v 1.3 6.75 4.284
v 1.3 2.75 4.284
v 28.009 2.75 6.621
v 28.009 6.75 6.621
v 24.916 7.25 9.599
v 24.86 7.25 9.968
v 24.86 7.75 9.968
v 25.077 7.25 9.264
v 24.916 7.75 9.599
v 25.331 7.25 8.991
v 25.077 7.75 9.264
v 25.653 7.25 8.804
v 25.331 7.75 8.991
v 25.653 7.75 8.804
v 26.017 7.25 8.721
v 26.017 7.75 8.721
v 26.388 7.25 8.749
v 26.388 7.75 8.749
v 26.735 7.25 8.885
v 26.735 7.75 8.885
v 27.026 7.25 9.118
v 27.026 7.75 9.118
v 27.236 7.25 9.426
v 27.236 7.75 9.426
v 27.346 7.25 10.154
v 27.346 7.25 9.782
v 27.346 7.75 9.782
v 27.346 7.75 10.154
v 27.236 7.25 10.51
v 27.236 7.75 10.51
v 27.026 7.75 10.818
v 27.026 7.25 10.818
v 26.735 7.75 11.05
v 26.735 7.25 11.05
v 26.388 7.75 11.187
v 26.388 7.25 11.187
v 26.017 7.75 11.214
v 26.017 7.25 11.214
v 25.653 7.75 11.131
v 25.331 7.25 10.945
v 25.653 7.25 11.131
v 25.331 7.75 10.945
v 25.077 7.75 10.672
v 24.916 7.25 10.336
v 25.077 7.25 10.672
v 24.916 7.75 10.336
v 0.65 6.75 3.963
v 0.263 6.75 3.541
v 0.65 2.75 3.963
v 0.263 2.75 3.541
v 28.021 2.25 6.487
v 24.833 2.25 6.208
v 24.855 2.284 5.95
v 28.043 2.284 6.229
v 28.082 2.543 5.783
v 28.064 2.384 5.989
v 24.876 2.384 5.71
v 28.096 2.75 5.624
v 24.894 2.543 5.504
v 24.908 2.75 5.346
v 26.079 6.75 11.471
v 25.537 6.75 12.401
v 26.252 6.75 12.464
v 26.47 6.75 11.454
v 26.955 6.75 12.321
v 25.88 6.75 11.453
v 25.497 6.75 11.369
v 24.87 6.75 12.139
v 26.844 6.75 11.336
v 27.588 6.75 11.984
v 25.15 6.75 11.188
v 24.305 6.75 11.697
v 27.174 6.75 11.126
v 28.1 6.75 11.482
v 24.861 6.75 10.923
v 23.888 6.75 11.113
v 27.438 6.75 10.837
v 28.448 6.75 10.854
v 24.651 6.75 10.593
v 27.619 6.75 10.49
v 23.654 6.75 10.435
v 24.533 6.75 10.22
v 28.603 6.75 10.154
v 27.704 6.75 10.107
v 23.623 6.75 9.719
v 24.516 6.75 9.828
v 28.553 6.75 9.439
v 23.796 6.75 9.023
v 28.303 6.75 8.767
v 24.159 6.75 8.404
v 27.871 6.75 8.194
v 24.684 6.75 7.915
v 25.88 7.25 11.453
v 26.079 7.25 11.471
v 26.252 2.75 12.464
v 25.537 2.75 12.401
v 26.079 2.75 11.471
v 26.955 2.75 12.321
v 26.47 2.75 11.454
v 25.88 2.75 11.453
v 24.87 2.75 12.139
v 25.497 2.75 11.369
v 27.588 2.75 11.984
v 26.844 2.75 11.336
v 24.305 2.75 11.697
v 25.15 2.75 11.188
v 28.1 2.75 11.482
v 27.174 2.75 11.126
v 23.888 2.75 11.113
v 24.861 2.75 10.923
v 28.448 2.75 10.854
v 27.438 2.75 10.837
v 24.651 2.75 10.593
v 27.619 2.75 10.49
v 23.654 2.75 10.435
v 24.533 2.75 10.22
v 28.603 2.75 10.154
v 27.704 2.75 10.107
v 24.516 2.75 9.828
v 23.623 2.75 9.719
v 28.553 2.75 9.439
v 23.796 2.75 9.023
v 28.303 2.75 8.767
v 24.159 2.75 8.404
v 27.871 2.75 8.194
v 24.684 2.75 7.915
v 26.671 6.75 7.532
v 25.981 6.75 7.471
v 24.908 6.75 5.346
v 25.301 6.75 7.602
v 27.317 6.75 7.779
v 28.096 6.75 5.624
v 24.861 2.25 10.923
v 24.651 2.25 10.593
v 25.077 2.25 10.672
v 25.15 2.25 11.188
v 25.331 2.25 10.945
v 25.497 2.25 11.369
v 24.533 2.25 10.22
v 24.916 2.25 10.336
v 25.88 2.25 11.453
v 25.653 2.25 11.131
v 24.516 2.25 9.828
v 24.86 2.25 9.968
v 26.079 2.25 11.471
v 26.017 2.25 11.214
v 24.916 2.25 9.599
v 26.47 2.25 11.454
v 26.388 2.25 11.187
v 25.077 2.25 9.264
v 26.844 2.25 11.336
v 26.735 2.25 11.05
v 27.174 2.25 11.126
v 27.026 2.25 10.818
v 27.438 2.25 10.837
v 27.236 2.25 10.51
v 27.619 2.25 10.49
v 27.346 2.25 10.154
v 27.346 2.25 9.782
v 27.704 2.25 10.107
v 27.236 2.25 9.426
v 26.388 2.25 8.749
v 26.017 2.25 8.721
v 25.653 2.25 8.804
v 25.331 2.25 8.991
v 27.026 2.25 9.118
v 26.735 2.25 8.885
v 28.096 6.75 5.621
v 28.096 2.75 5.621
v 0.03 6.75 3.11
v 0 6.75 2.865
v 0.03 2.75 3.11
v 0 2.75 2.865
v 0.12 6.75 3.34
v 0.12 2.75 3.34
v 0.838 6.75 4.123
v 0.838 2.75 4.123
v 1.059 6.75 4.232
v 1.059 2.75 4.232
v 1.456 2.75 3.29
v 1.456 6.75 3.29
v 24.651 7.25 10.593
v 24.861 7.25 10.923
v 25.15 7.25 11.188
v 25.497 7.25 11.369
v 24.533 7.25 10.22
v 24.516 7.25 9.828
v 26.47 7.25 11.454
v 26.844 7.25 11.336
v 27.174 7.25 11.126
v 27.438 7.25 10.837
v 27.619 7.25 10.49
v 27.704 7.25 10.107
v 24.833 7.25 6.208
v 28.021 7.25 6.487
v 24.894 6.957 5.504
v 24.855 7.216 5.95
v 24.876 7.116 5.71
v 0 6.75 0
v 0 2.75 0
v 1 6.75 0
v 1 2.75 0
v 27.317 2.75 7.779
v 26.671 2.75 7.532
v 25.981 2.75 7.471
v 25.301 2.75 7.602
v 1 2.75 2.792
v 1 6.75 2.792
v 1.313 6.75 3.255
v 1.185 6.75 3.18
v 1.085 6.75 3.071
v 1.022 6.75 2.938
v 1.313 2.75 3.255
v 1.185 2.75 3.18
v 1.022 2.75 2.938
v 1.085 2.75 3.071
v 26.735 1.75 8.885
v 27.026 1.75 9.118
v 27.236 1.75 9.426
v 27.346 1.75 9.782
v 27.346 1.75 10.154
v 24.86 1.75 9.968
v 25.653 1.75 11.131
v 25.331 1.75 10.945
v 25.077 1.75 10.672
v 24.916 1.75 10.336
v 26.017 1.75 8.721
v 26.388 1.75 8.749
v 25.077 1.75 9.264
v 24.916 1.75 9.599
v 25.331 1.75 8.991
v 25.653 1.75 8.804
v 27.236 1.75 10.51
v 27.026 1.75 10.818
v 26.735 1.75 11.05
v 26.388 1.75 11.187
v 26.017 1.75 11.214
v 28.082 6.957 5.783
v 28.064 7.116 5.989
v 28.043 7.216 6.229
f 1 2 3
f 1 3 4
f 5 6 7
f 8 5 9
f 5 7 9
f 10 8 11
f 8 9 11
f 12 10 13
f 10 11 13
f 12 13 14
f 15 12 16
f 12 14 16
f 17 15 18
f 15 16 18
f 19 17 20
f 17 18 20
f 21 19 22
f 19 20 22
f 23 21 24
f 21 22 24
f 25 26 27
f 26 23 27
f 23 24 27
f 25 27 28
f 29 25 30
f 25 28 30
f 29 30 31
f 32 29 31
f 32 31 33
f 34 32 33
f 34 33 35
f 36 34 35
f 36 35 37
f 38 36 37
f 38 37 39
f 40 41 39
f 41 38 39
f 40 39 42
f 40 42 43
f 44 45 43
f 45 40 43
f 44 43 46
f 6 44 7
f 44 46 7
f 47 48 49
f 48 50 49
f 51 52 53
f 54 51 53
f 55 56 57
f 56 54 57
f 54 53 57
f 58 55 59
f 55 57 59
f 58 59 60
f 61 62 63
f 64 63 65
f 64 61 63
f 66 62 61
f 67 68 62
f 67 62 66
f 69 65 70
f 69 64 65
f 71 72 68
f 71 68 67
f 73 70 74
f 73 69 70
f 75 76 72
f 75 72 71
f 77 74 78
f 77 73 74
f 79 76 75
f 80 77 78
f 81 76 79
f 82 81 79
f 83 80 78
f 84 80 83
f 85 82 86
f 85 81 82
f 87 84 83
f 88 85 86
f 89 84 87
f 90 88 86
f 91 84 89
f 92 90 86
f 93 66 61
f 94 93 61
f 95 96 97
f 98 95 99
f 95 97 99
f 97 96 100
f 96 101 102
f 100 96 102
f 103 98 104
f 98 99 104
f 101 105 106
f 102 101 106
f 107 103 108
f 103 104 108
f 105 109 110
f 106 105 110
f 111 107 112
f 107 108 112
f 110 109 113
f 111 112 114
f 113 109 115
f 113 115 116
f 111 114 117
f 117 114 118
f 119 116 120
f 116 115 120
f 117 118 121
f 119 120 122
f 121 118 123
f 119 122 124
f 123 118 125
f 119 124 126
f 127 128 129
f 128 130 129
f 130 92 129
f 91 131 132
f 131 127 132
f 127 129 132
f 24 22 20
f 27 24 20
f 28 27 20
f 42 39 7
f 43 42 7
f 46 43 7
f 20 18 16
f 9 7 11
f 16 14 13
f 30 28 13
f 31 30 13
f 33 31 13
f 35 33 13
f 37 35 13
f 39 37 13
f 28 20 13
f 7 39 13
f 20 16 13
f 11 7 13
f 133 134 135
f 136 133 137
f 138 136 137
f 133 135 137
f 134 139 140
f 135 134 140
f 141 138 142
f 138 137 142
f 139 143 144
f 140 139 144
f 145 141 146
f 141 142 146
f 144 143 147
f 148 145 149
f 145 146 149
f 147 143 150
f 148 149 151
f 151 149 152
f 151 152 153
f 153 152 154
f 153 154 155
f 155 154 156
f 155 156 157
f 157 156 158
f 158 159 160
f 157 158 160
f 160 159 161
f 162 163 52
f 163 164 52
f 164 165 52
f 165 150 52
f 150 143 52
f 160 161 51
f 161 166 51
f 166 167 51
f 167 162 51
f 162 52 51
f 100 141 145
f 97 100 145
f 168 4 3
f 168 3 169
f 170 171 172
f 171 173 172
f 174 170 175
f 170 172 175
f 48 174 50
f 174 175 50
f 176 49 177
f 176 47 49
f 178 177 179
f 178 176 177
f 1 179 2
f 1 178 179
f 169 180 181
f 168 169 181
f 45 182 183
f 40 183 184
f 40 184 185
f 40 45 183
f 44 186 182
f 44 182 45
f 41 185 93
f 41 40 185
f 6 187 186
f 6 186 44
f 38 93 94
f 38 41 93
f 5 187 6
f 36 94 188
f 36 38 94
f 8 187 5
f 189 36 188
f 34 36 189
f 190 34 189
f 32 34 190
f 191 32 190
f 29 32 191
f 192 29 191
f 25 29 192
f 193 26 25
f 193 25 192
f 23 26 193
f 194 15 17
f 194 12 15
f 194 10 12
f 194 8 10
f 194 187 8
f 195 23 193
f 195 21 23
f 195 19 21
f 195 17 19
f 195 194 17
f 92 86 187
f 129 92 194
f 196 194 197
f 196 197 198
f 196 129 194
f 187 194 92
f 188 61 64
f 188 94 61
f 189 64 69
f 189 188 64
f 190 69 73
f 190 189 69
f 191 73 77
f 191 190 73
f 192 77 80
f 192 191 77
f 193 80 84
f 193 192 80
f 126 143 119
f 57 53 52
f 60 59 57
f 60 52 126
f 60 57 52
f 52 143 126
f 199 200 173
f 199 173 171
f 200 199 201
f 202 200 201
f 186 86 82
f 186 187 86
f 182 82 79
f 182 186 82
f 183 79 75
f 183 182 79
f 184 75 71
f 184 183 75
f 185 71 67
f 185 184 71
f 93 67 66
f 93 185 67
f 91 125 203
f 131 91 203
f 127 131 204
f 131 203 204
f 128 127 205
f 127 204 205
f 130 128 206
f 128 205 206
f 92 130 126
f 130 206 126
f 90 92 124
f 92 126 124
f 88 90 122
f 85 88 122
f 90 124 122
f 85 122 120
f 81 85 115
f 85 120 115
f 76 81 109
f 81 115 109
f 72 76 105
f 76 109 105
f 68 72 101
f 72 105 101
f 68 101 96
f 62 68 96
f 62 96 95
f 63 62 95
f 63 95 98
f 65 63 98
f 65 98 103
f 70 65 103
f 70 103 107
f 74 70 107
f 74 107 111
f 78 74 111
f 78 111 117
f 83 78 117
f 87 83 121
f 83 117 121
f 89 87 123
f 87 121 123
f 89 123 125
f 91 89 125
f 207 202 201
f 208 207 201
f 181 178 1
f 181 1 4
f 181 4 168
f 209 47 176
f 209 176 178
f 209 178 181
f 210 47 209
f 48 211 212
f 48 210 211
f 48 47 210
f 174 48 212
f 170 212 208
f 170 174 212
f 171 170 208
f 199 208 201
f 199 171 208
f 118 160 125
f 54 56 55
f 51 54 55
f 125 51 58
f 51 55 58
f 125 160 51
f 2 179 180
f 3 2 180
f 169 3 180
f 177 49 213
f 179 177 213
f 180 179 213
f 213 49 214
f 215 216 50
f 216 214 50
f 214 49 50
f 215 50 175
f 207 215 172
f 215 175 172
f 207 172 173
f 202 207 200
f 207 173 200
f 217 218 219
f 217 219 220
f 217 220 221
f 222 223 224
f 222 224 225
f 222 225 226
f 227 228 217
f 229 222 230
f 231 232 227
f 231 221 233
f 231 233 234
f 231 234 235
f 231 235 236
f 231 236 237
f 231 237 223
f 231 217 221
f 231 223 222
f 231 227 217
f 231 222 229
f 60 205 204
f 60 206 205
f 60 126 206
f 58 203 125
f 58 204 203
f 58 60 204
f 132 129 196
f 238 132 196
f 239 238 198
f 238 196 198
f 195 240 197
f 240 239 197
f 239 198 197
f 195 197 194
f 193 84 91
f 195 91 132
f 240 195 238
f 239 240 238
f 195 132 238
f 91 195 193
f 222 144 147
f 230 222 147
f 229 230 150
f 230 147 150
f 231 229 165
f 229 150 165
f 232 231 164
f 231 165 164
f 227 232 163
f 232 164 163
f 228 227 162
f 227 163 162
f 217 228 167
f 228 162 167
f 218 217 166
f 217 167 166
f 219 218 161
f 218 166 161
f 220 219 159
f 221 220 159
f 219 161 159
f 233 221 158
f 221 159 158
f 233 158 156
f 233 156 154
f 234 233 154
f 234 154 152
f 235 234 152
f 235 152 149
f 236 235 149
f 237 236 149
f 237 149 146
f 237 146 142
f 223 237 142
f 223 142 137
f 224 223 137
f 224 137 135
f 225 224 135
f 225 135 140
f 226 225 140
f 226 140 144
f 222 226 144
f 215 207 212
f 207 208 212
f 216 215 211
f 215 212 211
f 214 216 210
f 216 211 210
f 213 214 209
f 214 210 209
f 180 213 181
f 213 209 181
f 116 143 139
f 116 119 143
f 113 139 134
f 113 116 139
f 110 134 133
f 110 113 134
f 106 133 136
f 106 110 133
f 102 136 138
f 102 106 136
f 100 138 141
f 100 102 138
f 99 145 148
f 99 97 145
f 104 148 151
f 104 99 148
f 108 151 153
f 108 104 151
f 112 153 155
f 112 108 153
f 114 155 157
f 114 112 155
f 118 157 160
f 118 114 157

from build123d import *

# Parameters (mm, degrees)
SKETCH1_W                  = 1
SKETCH1_H                  = 4
BOSS_EXTRUDE1_DEPTH        = 4.25
CHAMFER1_SIZE              = 1
CHAMFER1_SIZE2             = 0.087488664
SKETCH2_W                  = 1.003819838
SKETCH2_H                  = 4
BOSS_EXTRUDE2_DEPTH        = 27.2
CHAMFER2_START             = -4
CHAMFER2_OUTLINE_W         = 4
CHAMFER2_OUTLINE_H         = 7
CHAMFER2_DEPTH             = 1.801741323
FILLET2_R                  = 0.5
FILLET3_R                  = 1
BOSS_EXTRUDE3_DEPTH        = 5
BOSS_EXTRUDE3_DEPTH_BACK   = 1
SKETCH3_W                  = 3.2
SKETCH3_H                  = 0.5
BOSS_EXTRUDE3_2_DEPTH      = 5
BOSS_EXTRUDE3_2_DEPTH_BACK = 1
FILLET5_R                  = 1
FILLET6_R                  = 1
FILLET9_R                  = 1.5
FILLET10_R                 = 1.5
BOSS_EXTRUDE4_DEPTH        = 0.5
BOSS_EXTRUDE4_DEPTH_BACK   = 5.5
SKETCH5_R                  = 1.25
SKETCH6_R                  = 2.5
BOSS_EXTRUDE5_DEPTH        = 4


with BuildPart() as part:
    # Sketch1 → Boss-Extrude1 (new body)
    with BuildSketch(Plane.XY):
        with Locations((0.5, 4.75)):
            Rectangle(SKETCH1_W, SKETCH1_H)
    extrude(amount=BOSS_EXTRUDE1_DEPTH)

    # Chamfer1
    chamfer1_edges = [part.edges().sort_by_distance(p)[0] for p in [
        (1, 4.75, 4.25),
    ]]
    chamfer1_side = [part.faces().sort_by_distance(p)[0] for p in [
        (1, 4.75, 2.125),
    ]]
    chamfer(chamfer1_edges, length=CHAMFER1_SIZE, length2=CHAMFER1_SIZE2, reference=chamfer1_side[0])

    # Sketch2 → Boss-Extrude2 (add)
    with BuildSketch(Plane(origin=(1.274582165, 0, 0.11151149), x_dir=(0.08715574274765592, 0, -0.9961946980917458), z_dir=(0.9961946980917459, 0, 0.08715574274765593))):
        with Locations((-3.652386945, 4.75)):
            Rectangle(SKETCH2_W, SKETCH2_H)
    extrude(amount=BOSS_EXTRUDE2_DEPTH)

    # Chamfer2: read off the stored shape, not the designer's step
    # Chamfer2 outline → Chamfer2 (cut)
    with BuildSketch(Plane(origin=(0, 0, 0), x_dir=(0.6755902076156571, 0, 0.737277336810127), z_dir=(0.737277336810127, 0, -0.675590207615657)).offset(CHAMFER2_START)):
        with Locations((3, -4.5)):
            Rectangle(CHAMFER2_OUTLINE_W, CHAMFER2_OUTLINE_H)
    extrude(amount=CHAMFER2_DEPTH, mode=Mode.SUBTRACT)

    # Fillet2
    fillet2_edges = [part.edges().sort_by_distance(p)[0] for p in [
        (1, 4.75, 3.25),
    ]]
    fillet(fillet2_edges, radius=FILLET2_R)

    # Fillet3
    fillet3_edges = [part.edges().sort_by_distance(p)[0] for p in [
        (0, 4.75, 3.253834428),
        (0.912844258, 4.75, 4.250029127),
    ]]
    fillet(fillet3_edges, radius=FILLET3_R)


with BuildPart() as body_2:
    # Sketch3 → Boss-Extrude3 (new, two sides: drawn at the far end of the back side and taken through both)
    with BuildSketch(Plane(origin=(-0.362070829, 0, 4.13848851), x_dir=(0.9961946980917458, 0, 0.08715574274765595), z_dir=(-0.08715574274765596, 0, 0.9961946980917459)).offset(-BOSS_EXTRUDE3_DEPTH_BACK)):
        with Locations((26.879450862, 7)):
            Rectangle(SKETCH3_W, SKETCH3_H)
    extrude(amount=BOSS_EXTRUDE3_DEPTH + BOSS_EXTRUDE3_DEPTH_BACK)

    # Fillet5
    # the kernel refuses this fillet: 1 mm, written as the material it takes off along each edge
    with BuildSketch(Plane(origin=(22.751515044, 7.25, 5.15684541), x_dir=(-0.08715574274765596, 0, 0.9961946980917458), z_dir=(0.9961946980917459, 0, 0.08715574274765596))) as fillet5_piece_1:
        with BuildLine():
            CenterArc((0.866025404, 1), FILLET5_R, 210, 60)
            Line((0, 0.5), (-0.017320508, 0.49))
            ThreePointArc((-0.017320508, 0.49), (-0.02, 0.25), (-0.02, 0))
            Line((-0.02, 0), (0, -0.02))
            Line((0, -0.02), (0.866025404, -0.02))
            Line((0.866025404, -0.02), (0.866025404, 0))
        make_face()
    extrude(amount=7.530127019, mode=Mode.SUBTRACT)

    # Fillet10
    fillet10_edges = [body_2.edges().sort_by_distance(p)[0] for p in [
        (27.573228411, 7, 11.601609693),
        (24.385405377, 7, 11.322711316),
    ]]
    fillet(fillet10_edges, radius=FILLET10_R)



with BuildPart() as body_3:
    # Sketch3 → Boss-Extrude3 2 (new, two sides: drawn at the far end of the back side and taken through both)
    with BuildSketch(Plane(origin=(-0.362070829, 0, 4.13848851), x_dir=(0.9961946980917458, 0, 0.08715574274765595), z_dir=(-0.08715574274765596, 0, 0.9961946980917459)).offset(-BOSS_EXTRUDE3_2_DEPTH_BACK)):
        with Locations((26.879450862, 2.5)):
            Rectangle(SKETCH3_W, SKETCH3_H)
    extrude(amount=BOSS_EXTRUDE3_2_DEPTH + BOSS_EXTRUDE3_2_DEPTH_BACK)

    # Fillet6
    # the kernel refuses this fillet: 1 mm, written as the material it takes off along each edge
    with BuildSketch(Plane(origin=(22.751515044, 2.25, 5.15684541), x_dir=(0, 1, 0), z_dir=(0.9961946980917459, 0, 0.08715574274765596))) as fillet6_piece_1:
        with BuildLine():
            CenterArc((1, 0.866025404), FILLET6_R, 180, 60)
            Line((0, 0.866025404), (-0.02, 0.866025404))
            Line((-0.02, 0.866025404), (-0.02, 0))
            Line((-0.02, 0), (0, -0.02))
            ThreePointArc((0, -0.02), (0.25, -0.02), (0.49, -0.017320508))
            Line((0.49, -0.017320508), (0.5, 0))
        make_face()
    extrude(amount=7.530127019, mode=Mode.SUBTRACT)

    # Fillet9
    fillet9_edges = [body_3.edges().sort_by_distance(p)[0] for p in [
        (27.573228411, 2.5, 11.601609693),
        (24.385405377, 2.5, 11.322711316),
    ]]
    fillet(fillet9_edges, radius=FILLET9_R)


with BuildPart() as body_2_1:
    add(body_2.part)

    add(body_3.part)  # Boss-Extrude4 merges body 3
    # Sketch5 → Boss-Extrude4 (add, two sides: drawn at the far end of the back side and taken through both)
    with BuildSketch(Plane.XZ.offset(-2.25).offset(-BOSS_EXTRUDE4_DEPTH_BACK)):
        with Locations(Location((26.110050508, 9.967868458, 0), (0, 0, 180))):
            Circle(SKETCH5_R)
    extrude(amount=BOSS_EXTRUDE4_DEPTH + BOSS_EXTRUDE4_DEPTH_BACK)

    # Sketch6 → Boss-Extrude5 (add)
    with BuildSketch(Plane(origin=(0, 2.75, 0), x_dir=(1, 0, 0), z_dir=(0, 1, 0))):
        with Locations(Location((26.110050508, -9.967868458, 0), (0, 0, 45.2081805))):
            Circle(SKETCH6_R)
    extrude(amount=BOSS_EXTRUDE5_DEPTH)


solid = Compound([part.part, body_2_1.part])
